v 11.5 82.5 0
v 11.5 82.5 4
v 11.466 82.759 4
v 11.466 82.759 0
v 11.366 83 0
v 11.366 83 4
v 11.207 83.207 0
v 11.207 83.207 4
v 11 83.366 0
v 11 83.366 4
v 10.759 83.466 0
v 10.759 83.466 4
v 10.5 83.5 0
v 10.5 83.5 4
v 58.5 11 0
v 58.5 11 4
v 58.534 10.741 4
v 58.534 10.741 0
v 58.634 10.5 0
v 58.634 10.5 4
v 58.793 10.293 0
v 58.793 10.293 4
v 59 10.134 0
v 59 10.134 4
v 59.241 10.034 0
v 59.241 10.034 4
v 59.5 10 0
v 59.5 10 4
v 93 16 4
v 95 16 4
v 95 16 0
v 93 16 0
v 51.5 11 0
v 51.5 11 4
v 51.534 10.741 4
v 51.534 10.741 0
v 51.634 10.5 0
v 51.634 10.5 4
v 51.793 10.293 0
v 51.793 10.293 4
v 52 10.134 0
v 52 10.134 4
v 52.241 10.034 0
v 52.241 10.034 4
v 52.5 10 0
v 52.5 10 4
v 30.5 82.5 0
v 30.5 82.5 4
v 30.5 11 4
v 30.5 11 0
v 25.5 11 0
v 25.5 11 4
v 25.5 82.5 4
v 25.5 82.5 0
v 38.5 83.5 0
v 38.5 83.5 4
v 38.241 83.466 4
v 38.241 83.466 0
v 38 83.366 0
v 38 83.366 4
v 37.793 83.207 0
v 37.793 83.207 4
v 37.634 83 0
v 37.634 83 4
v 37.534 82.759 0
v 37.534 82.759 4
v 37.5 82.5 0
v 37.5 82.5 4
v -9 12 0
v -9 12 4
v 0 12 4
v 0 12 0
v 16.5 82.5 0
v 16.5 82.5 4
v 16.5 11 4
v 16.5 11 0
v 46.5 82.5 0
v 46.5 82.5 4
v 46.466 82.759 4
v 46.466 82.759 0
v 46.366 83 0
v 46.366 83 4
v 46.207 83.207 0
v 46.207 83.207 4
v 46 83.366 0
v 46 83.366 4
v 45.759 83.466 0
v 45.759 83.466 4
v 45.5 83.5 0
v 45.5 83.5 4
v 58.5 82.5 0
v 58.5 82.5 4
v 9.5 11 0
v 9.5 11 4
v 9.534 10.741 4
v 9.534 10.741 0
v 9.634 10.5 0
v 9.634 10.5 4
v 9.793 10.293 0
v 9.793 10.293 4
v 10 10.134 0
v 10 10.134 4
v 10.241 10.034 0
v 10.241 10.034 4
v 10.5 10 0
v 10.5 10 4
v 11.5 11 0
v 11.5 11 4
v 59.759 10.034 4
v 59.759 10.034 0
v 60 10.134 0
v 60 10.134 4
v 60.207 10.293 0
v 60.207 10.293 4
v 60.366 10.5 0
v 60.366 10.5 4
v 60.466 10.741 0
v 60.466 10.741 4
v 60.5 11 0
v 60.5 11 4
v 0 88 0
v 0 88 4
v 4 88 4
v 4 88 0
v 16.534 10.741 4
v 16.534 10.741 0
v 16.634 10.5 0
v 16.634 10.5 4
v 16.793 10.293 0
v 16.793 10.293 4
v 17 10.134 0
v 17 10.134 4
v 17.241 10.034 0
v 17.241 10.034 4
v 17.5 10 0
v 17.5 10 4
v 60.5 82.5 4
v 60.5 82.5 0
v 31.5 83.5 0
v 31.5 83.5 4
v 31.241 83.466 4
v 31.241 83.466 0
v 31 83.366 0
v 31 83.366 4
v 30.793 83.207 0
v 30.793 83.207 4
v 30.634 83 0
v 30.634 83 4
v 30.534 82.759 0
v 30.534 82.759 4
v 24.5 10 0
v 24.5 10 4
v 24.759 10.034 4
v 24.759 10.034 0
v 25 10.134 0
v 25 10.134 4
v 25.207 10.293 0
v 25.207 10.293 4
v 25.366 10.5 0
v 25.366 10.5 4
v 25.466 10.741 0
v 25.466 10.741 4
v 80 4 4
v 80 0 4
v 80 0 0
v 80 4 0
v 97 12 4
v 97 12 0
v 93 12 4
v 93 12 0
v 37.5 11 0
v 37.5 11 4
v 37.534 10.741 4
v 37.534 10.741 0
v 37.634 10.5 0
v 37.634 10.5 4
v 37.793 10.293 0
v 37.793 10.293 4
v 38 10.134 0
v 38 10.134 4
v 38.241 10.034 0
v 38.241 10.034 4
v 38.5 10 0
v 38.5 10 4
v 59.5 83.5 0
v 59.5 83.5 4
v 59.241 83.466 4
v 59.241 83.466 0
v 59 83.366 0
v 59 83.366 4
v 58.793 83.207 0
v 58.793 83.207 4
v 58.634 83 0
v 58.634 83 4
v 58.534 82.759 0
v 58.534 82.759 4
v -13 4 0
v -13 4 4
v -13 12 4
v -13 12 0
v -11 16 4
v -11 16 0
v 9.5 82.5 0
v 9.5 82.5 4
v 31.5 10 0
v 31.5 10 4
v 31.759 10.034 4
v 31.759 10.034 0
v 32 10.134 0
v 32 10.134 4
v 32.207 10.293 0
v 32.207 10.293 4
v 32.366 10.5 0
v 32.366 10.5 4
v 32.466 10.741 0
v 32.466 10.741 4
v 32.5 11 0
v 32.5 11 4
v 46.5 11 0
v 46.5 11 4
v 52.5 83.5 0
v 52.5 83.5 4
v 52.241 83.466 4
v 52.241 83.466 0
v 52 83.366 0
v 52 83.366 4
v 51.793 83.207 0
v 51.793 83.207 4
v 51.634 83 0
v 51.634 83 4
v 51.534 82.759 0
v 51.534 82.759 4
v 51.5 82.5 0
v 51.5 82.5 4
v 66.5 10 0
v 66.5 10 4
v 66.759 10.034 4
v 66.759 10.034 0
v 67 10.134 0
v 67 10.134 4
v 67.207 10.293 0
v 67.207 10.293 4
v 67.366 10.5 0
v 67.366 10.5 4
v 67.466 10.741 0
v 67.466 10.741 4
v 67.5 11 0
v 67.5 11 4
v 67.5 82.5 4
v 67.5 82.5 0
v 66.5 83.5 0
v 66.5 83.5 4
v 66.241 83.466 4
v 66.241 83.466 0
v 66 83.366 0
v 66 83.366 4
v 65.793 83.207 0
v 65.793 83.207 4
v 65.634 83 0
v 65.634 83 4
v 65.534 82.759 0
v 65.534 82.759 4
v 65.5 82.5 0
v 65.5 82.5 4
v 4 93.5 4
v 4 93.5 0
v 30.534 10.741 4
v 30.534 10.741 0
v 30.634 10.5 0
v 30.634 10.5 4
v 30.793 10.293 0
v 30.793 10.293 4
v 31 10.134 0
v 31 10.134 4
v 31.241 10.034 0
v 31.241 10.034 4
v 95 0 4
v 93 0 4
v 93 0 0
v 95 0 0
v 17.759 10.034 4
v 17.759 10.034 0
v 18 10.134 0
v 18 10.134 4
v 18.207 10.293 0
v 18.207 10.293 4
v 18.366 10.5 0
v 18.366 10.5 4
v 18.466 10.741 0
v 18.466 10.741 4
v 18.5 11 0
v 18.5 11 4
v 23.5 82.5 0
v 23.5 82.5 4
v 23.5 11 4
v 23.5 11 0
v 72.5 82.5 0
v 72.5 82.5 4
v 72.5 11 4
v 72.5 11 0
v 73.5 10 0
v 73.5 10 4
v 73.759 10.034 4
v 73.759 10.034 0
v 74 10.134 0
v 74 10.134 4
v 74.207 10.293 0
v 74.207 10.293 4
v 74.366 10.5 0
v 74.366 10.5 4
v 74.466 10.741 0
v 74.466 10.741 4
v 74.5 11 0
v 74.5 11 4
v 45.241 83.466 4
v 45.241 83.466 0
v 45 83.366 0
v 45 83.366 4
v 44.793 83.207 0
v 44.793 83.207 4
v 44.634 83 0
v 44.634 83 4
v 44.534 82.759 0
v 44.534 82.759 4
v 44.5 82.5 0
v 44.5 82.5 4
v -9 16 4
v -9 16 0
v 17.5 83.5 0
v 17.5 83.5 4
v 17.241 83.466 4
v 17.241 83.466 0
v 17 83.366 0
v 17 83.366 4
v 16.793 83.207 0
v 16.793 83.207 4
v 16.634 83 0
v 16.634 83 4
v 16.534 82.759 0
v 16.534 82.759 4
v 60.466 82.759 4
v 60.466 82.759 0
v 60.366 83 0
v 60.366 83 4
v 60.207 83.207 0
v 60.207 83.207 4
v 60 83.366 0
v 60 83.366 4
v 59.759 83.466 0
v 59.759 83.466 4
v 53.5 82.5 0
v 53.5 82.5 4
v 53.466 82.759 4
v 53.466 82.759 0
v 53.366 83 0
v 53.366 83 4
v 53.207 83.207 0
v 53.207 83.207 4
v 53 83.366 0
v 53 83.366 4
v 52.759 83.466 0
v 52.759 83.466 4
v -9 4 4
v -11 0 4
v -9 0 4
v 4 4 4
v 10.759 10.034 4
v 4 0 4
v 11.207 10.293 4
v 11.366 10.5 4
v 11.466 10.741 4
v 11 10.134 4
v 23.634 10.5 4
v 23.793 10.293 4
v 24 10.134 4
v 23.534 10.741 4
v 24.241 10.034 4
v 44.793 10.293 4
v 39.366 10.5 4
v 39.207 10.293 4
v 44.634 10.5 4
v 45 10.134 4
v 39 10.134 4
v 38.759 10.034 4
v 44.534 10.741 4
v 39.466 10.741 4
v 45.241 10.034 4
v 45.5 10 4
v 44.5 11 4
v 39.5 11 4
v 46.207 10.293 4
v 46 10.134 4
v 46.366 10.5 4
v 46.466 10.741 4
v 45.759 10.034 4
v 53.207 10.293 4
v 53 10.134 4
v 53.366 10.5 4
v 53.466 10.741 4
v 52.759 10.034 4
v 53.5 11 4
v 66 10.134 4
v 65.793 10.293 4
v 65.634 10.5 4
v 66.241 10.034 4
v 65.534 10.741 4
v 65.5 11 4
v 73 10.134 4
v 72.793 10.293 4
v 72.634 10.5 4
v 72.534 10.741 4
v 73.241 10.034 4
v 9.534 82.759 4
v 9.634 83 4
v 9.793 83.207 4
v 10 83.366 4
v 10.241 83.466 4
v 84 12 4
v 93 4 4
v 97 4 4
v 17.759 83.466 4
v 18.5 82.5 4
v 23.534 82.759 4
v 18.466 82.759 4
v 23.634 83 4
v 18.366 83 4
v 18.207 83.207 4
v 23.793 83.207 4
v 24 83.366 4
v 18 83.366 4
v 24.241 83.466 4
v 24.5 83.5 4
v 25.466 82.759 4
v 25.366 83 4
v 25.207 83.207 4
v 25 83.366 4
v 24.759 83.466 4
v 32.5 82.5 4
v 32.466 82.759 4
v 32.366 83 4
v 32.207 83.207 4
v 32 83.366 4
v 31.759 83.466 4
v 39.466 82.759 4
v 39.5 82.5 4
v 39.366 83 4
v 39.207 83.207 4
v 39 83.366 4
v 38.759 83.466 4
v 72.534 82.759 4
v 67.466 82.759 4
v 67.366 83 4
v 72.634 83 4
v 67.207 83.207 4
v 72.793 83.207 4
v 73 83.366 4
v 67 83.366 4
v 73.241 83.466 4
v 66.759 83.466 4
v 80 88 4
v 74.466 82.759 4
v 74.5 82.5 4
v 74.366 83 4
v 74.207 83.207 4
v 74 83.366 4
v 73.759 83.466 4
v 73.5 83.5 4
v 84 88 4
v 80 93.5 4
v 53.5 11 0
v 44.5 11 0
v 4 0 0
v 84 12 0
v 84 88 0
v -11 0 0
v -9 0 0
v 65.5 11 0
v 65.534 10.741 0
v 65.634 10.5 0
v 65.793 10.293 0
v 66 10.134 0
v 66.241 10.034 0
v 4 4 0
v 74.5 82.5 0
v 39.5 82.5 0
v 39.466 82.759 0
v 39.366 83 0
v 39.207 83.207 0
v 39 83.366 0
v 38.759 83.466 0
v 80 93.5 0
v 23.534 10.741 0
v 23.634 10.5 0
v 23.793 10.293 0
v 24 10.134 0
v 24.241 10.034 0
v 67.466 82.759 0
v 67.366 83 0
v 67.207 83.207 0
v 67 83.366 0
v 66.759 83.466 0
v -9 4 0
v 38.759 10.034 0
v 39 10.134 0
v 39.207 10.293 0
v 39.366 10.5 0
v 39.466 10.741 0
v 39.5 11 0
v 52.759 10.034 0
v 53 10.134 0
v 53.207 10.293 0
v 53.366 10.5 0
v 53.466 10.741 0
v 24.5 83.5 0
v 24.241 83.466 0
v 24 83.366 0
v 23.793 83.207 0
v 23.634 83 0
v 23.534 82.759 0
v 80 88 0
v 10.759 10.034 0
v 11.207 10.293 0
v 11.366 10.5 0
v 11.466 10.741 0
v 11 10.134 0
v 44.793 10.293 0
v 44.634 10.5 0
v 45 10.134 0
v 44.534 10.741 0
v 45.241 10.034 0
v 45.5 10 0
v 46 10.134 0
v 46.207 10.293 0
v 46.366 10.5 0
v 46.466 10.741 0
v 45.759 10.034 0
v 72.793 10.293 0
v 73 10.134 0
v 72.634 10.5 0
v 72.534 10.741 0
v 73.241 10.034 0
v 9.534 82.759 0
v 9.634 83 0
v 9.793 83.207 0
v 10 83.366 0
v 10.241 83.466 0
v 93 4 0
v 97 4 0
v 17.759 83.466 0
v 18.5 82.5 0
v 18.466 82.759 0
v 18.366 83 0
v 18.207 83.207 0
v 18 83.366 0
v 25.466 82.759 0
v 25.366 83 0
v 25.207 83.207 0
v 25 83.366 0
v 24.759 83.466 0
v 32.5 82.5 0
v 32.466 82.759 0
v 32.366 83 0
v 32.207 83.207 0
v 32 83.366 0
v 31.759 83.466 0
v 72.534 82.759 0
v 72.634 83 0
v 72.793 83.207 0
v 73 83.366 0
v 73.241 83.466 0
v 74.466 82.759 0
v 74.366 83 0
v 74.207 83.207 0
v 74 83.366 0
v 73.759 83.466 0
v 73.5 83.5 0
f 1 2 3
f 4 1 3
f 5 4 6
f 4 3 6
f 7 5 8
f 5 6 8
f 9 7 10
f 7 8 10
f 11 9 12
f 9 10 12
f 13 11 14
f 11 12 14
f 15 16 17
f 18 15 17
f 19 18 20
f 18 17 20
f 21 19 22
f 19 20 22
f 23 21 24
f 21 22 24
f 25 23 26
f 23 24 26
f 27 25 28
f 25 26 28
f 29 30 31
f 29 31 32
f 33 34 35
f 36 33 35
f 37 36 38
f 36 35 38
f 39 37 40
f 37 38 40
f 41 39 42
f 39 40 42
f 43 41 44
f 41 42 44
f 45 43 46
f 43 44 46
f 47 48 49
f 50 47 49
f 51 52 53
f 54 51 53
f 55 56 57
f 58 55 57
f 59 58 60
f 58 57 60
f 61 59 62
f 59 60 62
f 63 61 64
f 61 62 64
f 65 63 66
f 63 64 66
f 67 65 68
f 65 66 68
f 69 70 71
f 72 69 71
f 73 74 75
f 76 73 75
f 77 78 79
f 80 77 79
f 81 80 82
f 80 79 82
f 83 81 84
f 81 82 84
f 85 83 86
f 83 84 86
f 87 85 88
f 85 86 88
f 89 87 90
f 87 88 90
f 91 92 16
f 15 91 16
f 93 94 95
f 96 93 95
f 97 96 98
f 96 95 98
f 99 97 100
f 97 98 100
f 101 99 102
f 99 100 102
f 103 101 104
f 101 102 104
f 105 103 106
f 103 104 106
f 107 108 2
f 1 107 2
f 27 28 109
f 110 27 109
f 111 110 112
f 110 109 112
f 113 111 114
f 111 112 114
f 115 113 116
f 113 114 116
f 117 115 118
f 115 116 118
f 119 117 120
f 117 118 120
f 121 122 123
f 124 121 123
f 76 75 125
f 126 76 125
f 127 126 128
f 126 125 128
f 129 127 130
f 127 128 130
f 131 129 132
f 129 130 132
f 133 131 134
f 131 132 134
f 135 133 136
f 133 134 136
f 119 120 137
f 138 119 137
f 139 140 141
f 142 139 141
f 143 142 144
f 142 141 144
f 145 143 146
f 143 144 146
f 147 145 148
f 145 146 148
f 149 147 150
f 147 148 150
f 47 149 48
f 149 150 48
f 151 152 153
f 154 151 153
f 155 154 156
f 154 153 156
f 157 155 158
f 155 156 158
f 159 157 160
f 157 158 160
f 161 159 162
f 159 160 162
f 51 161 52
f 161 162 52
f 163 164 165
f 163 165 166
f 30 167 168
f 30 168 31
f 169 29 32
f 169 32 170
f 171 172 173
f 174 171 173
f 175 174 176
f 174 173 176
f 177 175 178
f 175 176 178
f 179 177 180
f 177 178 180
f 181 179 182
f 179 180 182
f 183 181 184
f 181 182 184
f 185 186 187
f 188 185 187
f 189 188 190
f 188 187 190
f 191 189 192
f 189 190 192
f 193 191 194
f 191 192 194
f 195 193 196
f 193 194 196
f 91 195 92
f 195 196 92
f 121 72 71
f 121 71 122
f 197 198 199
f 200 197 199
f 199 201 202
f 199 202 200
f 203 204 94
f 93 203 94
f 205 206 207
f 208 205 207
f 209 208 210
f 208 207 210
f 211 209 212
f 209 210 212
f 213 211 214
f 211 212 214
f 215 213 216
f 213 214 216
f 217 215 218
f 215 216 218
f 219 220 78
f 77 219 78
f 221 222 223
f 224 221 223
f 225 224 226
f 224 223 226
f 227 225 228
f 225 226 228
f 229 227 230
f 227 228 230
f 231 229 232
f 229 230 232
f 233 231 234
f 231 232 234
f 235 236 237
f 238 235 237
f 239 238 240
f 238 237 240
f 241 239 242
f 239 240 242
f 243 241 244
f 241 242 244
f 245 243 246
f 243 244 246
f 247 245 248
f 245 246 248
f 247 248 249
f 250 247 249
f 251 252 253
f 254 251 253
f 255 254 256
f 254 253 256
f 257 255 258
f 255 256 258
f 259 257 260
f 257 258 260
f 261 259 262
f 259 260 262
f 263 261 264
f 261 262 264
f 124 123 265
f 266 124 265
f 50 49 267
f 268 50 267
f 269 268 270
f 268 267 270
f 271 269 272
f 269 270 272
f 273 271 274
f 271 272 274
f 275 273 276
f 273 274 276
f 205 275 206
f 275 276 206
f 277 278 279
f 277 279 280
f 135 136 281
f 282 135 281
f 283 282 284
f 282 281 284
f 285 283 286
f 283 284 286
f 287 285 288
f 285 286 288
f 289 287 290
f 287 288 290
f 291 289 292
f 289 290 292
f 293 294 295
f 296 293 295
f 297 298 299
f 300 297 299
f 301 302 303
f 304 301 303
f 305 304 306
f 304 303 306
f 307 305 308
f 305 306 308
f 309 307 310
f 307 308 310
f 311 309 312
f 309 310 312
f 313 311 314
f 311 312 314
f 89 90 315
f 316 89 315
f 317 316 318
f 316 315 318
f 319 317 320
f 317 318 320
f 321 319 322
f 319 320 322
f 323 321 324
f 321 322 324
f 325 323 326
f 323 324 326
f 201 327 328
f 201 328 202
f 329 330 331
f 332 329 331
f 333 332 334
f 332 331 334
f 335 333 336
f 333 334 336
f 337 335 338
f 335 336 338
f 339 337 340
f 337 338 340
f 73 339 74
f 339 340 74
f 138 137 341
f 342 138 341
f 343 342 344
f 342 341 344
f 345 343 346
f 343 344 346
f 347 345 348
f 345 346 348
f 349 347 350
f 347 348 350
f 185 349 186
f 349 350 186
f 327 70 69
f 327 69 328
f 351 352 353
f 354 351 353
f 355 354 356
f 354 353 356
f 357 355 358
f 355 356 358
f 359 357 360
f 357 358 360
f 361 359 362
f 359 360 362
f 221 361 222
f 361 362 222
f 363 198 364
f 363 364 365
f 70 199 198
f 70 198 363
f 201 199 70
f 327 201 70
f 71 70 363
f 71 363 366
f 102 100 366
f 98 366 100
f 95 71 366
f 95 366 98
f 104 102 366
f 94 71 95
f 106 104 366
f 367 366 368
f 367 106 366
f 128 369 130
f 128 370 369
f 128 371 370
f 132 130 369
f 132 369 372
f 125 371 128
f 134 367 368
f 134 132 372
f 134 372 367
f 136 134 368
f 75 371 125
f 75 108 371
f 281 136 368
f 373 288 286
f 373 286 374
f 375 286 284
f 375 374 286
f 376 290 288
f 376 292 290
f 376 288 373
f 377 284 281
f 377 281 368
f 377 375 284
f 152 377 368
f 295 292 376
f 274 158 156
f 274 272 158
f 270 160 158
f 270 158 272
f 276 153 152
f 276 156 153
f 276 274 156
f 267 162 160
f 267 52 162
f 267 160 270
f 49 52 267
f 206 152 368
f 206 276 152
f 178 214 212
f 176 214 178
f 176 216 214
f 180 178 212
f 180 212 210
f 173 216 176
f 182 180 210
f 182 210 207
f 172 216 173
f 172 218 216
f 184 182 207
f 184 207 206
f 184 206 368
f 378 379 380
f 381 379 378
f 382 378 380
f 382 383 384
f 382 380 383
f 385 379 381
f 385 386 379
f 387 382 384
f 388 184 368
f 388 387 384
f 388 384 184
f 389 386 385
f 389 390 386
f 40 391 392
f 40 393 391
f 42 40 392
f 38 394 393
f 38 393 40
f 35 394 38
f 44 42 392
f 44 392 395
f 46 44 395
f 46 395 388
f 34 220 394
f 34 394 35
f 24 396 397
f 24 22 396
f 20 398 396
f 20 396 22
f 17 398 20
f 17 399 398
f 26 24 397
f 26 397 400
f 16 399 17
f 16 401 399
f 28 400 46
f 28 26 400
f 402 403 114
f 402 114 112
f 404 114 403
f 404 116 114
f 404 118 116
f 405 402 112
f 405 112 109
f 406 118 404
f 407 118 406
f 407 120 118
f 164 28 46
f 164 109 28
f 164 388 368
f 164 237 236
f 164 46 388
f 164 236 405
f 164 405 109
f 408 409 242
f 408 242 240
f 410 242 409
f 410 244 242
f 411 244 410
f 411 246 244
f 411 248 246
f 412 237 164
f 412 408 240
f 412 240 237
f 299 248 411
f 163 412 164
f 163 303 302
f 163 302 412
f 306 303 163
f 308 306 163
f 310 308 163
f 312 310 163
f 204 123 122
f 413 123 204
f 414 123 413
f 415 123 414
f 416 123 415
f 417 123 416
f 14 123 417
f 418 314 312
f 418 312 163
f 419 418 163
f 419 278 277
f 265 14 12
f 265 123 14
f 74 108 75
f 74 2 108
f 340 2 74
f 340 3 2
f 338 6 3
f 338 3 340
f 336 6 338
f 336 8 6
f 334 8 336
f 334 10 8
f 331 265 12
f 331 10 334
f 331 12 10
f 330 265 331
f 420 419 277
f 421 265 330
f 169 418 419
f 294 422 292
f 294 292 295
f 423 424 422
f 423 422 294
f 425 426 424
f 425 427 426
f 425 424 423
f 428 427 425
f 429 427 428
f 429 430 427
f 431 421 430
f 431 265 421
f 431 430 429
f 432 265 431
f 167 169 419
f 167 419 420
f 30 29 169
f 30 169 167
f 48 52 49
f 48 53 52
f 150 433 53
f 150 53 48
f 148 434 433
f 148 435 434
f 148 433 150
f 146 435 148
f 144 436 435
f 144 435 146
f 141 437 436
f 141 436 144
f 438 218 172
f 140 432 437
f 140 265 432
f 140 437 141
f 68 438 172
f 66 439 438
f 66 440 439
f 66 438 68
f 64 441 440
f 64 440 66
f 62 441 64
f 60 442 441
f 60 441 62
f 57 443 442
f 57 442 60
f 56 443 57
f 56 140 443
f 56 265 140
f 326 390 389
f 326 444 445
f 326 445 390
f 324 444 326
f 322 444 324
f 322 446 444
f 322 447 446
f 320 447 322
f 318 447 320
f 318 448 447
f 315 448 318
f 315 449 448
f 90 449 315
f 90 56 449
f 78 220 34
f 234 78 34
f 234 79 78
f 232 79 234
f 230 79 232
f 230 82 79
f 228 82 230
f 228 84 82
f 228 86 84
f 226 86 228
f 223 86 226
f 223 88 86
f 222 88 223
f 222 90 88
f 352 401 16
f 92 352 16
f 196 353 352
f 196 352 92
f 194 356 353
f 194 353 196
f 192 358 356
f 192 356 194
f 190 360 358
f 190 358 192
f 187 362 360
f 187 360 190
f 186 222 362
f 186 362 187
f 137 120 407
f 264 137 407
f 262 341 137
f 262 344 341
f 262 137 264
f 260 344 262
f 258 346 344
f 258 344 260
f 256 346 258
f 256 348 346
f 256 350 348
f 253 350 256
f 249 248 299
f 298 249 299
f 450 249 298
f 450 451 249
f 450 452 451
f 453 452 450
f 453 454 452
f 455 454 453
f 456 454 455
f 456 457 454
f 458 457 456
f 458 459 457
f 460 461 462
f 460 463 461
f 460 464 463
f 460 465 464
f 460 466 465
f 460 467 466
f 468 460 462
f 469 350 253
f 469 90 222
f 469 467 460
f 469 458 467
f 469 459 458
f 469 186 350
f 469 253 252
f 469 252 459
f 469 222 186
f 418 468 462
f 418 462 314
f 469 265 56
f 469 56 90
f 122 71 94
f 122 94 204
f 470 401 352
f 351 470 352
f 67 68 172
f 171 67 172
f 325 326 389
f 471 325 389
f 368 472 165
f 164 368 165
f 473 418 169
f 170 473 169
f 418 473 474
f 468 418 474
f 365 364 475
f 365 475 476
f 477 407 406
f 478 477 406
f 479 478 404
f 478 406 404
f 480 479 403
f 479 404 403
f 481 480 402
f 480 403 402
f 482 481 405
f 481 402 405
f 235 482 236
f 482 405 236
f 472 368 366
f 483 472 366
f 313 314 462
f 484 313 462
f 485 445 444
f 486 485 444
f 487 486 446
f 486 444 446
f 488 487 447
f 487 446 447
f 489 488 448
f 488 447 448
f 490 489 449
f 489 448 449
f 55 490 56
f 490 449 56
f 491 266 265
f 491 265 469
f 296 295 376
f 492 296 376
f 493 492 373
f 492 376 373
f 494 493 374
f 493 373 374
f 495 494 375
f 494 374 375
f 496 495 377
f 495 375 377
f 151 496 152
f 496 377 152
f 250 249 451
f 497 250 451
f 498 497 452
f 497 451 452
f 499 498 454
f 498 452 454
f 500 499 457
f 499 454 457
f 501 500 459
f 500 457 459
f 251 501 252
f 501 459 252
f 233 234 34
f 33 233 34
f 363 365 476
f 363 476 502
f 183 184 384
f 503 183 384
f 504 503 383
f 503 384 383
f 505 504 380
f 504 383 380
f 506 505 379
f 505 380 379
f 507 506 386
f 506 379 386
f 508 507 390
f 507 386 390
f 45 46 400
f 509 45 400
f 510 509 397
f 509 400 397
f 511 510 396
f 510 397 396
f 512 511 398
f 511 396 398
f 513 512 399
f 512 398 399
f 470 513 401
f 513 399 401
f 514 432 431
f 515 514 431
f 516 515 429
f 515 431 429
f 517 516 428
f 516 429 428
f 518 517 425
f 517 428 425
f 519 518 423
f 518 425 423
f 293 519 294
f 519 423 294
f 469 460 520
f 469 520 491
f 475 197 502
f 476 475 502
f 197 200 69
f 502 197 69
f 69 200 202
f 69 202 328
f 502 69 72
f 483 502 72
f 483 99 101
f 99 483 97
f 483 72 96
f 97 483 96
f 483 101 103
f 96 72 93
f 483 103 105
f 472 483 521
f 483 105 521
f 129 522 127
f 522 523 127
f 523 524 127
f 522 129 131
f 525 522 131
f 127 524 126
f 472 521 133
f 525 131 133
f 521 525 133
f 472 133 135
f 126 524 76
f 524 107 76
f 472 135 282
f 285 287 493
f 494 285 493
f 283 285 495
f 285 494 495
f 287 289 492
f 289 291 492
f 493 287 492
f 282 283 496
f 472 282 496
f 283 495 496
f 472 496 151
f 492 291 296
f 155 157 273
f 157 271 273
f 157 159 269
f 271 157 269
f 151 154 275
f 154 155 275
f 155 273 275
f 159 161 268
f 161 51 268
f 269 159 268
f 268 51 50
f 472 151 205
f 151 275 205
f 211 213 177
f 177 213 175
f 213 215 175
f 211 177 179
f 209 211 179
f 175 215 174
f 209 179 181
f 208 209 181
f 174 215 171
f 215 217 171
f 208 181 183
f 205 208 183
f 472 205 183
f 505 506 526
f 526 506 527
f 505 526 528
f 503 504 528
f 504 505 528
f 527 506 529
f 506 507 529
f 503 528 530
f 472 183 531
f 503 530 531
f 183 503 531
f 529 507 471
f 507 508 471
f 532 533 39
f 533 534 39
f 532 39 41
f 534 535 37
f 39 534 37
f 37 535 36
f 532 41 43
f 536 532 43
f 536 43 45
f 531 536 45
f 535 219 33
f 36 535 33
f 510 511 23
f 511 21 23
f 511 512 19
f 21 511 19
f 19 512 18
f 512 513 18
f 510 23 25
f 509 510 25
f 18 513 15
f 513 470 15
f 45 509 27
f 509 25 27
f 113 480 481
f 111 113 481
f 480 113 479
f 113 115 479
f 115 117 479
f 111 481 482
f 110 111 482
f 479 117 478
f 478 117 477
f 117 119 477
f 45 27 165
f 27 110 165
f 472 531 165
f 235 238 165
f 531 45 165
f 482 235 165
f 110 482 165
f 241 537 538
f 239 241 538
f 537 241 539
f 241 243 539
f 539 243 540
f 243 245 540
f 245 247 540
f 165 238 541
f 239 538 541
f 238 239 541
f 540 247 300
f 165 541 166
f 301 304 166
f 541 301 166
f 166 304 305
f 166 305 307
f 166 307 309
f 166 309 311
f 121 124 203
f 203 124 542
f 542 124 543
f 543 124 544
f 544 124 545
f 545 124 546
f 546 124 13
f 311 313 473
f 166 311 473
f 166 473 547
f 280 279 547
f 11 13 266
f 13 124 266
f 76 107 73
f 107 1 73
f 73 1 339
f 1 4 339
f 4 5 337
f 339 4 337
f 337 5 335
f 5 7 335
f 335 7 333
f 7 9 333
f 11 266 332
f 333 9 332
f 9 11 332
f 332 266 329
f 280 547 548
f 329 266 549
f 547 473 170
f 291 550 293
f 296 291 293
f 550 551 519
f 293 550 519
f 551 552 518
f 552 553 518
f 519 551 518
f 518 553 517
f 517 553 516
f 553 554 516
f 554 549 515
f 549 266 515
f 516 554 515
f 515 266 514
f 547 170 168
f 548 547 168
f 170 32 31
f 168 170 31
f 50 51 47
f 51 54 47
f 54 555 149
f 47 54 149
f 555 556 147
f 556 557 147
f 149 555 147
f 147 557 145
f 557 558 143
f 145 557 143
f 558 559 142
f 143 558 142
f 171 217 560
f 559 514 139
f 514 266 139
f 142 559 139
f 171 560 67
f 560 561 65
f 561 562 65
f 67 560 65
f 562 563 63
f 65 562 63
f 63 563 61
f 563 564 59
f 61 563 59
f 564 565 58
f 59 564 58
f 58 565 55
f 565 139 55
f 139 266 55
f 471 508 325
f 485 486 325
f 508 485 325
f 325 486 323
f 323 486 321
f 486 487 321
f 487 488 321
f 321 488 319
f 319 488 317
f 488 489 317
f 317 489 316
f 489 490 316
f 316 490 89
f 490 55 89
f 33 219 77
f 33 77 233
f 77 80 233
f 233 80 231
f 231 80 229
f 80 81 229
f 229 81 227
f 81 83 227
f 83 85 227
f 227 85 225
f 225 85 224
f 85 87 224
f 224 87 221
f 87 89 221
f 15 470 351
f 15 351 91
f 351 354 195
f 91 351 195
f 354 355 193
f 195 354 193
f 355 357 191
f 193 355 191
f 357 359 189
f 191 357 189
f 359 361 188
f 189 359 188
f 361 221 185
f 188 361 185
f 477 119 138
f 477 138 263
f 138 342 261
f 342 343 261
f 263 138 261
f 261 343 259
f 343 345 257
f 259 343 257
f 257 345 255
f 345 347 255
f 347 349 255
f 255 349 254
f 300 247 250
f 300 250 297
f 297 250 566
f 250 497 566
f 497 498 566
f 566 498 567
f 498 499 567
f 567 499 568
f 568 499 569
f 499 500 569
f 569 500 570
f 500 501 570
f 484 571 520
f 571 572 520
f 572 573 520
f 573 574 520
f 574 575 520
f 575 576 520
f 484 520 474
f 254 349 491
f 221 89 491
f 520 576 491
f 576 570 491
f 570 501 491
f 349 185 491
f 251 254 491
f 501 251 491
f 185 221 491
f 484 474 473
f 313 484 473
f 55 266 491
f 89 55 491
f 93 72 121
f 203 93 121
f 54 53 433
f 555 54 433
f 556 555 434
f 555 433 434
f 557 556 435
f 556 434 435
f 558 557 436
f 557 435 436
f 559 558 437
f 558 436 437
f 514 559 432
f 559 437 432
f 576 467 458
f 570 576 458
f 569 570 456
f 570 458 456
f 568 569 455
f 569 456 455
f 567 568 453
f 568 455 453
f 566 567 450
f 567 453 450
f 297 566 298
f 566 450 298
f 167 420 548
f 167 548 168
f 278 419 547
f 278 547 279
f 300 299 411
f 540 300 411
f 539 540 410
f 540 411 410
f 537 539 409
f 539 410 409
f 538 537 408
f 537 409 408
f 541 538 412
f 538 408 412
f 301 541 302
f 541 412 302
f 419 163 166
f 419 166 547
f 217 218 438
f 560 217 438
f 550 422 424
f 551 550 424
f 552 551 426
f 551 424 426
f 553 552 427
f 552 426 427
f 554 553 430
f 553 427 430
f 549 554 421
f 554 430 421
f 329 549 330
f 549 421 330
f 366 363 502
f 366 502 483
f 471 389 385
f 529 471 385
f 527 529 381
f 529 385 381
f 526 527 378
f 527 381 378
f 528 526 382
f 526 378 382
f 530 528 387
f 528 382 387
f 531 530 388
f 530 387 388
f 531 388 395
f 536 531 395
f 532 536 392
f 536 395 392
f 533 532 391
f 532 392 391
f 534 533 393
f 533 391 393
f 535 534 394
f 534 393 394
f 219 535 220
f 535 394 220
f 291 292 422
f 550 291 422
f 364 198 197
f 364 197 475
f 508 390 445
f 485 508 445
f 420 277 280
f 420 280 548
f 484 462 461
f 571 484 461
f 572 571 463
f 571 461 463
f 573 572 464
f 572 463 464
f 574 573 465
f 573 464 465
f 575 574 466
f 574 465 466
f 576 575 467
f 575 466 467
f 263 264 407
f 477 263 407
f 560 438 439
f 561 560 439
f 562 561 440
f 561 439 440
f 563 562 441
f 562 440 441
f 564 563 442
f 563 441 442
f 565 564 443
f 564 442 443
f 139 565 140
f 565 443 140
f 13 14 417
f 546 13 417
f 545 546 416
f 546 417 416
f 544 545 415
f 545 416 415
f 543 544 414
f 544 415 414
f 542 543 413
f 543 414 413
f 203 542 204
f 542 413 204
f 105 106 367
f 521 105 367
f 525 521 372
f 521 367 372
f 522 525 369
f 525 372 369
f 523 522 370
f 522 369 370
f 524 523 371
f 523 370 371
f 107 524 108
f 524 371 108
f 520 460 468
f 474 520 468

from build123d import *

# Parameters (mm, degrees)
F0_W     = 84
F0_H     = 93.5
F1_DEPTH = 4
F2_W     = 4
F2_H     = 4
F2_H_2   = 5.5
F3_DEPTH = 4
F5_DEPTH = 4
F6_W     = 13
F6_H     = 8
F7_DEPTH = 4
F9_DEPTH = 4


with BuildPart() as f1:
    # F0 (on Top) → F1 (new body)
    with BuildSketch(Plane.XY):
        with Locations((42, 46.75)):
            Rectangle(F0_W, F0_H)
    extrude(amount=F1_DEPTH)

    # F2 (on face) → F3 (cut, through all)
    with BuildSketch(Plane.XY.offset(4)):
        with Locations((2, 2)):
            Rectangle(F2_W, F2_H)
        with Locations((82, 2)):
            Rectangle(F2_W, F2_H)
        with Locations((2, 90.75)):
            Rectangle(F2_W, F2_H_2)
        with Locations((82, 90.75)):
            Rectangle(F2_W, F2_H_2)
    extrude(amount=-F3_DEPTH, mode=Mode.SUBTRACT)

    # F4 (on face) → F5 (cut, through all)
    with BuildSketch(Plane.XY.offset(4)):
        with BuildLine():
            ThreePointArc((10.5, 83.5), (9.792893, 83.207107), (9.5, 82.5))
            Line((9.5, 82.5), (9.5, 11))
            ThreePointArc((9.5, 11), (9.792893, 10.292893), (10.5, 10))
            ThreePointArc((10.5, 10), (11.207107, 10.292893), (11.5, 11))
            Line((11.5, 11), (11.5, 82.5))
            ThreePointArc((11.5, 82.5), (11.207107, 83.207107), (10.5, 83.5))
        make_face()
        with BuildLine():
            ThreePointArc((17.5, 83.5), (16.792893, 83.207107), (16.5, 82.5))
            Line((16.5, 82.5), (16.5, 11))
            ThreePointArc((16.5, 11), (16.792893, 10.292893), (17.5, 10))
            ThreePointArc((17.5, 10), (18.207107, 10.292893), (18.5, 11))
            Line((18.5, 11), (18.5, 82.5))
            ThreePointArc((18.5, 82.5), (18.207107, 83.207107), (17.5, 83.5))
        make_face()
        with BuildLine():
            ThreePointArc((24.5, 83.5), (23.792893, 83.207107), (23.5, 82.5))
            Line((23.5, 82.5), (23.5, 11))
            ThreePointArc((23.5, 11), (23.792893, 10.292893), (24.5, 10))
            ThreePointArc((24.5, 10), (25.207107, 10.292893), (25.5, 11))
            Line((25.5, 11), (25.5, 82.5))
            ThreePointArc((25.5, 82.5), (25.207107, 83.207107), (24.5, 83.5))
        make_face()
        with BuildLine():
            ThreePointArc((31.5, 83.5), (30.792893, 83.207107), (30.5, 82.5))
            Line((30.5, 82.5), (30.5, 11))
            ThreePointArc((30.5, 11), (30.792893, 10.292893), (31.5, 10))
            ThreePointArc((31.5, 10), (32.207107, 10.292893), (32.5, 11))
            Line((32.5, 11), (32.5, 82.5))
            ThreePointArc((32.5, 82.5), (32.207107, 83.207107), (31.5, 83.5))
        make_face()
        with BuildLine():
            ThreePointArc((38.5, 83.5), (37.792893, 83.207107), (37.5, 82.5))
            Line((37.5, 82.5), (37.5, 11))
            ThreePointArc((37.5, 11), (37.792893, 10.292893), (38.5, 10))
            ThreePointArc((38.5, 10), (39.207107, 10.292893), (39.5, 11))
            Line((39.5, 11), (39.5, 82.5))
            ThreePointArc((39.5, 82.5), (39.207107, 83.207107), (38.5, 83.5))
        make_face()
        with BuildLine():
            ThreePointArc((45.5, 83.5), (44.792893, 83.207107), (44.5, 82.5))
            Line((44.5, 82.5), (44.5, 11))
            ThreePointArc((44.5, 11), (44.792893, 10.292893), (45.5, 10))
            ThreePointArc((45.5, 10), (46.207107, 10.292893), (46.5, 11))
            Line((46.5, 11), (46.5, 82.5))
            ThreePointArc((46.5, 82.5), (46.207107, 83.207107), (45.5, 83.5))
        make_face()
        with BuildLine():
            ThreePointArc((52.5, 83.5), (51.792893, 83.207107), (51.5, 82.5))
            Line((51.5, 82.5), (51.5, 11))
            ThreePointArc((51.5, 11), (51.792893, 10.292893), (52.5, 10))
            ThreePointArc((52.5, 10), (53.207107, 10.292893), (53.5, 11))
            Line((53.5, 11), (53.5, 82.5))
            ThreePointArc((53.5, 82.5), (53.207107, 83.207107), (52.5, 83.5))
        make_face()
        with BuildLine():
            ThreePointArc((59.5, 83.5), (58.792893, 83.207107), (58.5, 82.5))
            Line((58.5, 82.5), (58.5, 11))
            ThreePointArc((58.5, 11), (58.792893, 10.292893), (59.5, 10))
            ThreePointArc((59.5, 10), (60.207107, 10.292893), (60.5, 11))
            Line((60.5, 11), (60.5, 82.5))
            ThreePointArc((60.5, 82.5), (60.207107, 83.207107), (59.5, 83.5))
        make_face()
        with BuildLine():
            ThreePointArc((66.5, 83.5), (65.792893, 83.207107), (65.5, 82.5))
            Line((65.5, 82.5), (65.5, 11))
            ThreePointArc((65.5, 11), (65.792893, 10.292893), (66.5, 10))
            ThreePointArc((66.5, 10), (67.207107, 10.292893), (67.5, 11))
            Line((67.5, 11), (67.5, 82.5))
            ThreePointArc((67.5, 82.5), (67.207107, 83.207107), (66.5, 83.5))
        make_face()
        with BuildLine():
            ThreePointArc((73.5, 83.5), (72.792893, 83.207107), (72.5, 82.5))
            Line((72.5, 82.5), (72.5, 11))
            ThreePointArc((72.5, 11), (72.792893, 10.292893), (73.5, 10))
            ThreePointArc((73.5, 10), (74.207107, 10.292893), (74.5, 11))
            Line((74.5, 11), (74.5, 82.5))
            ThreePointArc((74.5, 82.5), (74.207107, 83.207107), (73.5, 83.5))
        make_face()
    extrude(amount=-F5_DEPTH, mode=Mode.SUBTRACT)

    # F6 (on face) → F7 (join)
    with BuildSketch(Plane.XY.offset(4)):
        with Locations((90.5, 8)):
            Rectangle(F6_W, F6_H)
        with Locations((-6.5, 8)):
            Rectangle(F6_W, F6_H)
    extrude(amount=-F7_DEPTH)

    # F8 (on face) → F9 (join)
    with BuildSketch(Plane.XY.offset(4)):
        Polygon((93, 16), (93, 12), (97, 12), (95, 16), align=None)
        Polygon((93, 4), (93, 0), (95, 0), (97, 4), align=None)
        Polygon((-11, 16), (-13, 12), (-9, 12), (-9, 16), align=None)
        Polygon((-11, 0), (-9, 0), (-9, 4), (-13, 4), align=None)
    extrude(amount=-F9_DEPTH)


solid = f1.part
